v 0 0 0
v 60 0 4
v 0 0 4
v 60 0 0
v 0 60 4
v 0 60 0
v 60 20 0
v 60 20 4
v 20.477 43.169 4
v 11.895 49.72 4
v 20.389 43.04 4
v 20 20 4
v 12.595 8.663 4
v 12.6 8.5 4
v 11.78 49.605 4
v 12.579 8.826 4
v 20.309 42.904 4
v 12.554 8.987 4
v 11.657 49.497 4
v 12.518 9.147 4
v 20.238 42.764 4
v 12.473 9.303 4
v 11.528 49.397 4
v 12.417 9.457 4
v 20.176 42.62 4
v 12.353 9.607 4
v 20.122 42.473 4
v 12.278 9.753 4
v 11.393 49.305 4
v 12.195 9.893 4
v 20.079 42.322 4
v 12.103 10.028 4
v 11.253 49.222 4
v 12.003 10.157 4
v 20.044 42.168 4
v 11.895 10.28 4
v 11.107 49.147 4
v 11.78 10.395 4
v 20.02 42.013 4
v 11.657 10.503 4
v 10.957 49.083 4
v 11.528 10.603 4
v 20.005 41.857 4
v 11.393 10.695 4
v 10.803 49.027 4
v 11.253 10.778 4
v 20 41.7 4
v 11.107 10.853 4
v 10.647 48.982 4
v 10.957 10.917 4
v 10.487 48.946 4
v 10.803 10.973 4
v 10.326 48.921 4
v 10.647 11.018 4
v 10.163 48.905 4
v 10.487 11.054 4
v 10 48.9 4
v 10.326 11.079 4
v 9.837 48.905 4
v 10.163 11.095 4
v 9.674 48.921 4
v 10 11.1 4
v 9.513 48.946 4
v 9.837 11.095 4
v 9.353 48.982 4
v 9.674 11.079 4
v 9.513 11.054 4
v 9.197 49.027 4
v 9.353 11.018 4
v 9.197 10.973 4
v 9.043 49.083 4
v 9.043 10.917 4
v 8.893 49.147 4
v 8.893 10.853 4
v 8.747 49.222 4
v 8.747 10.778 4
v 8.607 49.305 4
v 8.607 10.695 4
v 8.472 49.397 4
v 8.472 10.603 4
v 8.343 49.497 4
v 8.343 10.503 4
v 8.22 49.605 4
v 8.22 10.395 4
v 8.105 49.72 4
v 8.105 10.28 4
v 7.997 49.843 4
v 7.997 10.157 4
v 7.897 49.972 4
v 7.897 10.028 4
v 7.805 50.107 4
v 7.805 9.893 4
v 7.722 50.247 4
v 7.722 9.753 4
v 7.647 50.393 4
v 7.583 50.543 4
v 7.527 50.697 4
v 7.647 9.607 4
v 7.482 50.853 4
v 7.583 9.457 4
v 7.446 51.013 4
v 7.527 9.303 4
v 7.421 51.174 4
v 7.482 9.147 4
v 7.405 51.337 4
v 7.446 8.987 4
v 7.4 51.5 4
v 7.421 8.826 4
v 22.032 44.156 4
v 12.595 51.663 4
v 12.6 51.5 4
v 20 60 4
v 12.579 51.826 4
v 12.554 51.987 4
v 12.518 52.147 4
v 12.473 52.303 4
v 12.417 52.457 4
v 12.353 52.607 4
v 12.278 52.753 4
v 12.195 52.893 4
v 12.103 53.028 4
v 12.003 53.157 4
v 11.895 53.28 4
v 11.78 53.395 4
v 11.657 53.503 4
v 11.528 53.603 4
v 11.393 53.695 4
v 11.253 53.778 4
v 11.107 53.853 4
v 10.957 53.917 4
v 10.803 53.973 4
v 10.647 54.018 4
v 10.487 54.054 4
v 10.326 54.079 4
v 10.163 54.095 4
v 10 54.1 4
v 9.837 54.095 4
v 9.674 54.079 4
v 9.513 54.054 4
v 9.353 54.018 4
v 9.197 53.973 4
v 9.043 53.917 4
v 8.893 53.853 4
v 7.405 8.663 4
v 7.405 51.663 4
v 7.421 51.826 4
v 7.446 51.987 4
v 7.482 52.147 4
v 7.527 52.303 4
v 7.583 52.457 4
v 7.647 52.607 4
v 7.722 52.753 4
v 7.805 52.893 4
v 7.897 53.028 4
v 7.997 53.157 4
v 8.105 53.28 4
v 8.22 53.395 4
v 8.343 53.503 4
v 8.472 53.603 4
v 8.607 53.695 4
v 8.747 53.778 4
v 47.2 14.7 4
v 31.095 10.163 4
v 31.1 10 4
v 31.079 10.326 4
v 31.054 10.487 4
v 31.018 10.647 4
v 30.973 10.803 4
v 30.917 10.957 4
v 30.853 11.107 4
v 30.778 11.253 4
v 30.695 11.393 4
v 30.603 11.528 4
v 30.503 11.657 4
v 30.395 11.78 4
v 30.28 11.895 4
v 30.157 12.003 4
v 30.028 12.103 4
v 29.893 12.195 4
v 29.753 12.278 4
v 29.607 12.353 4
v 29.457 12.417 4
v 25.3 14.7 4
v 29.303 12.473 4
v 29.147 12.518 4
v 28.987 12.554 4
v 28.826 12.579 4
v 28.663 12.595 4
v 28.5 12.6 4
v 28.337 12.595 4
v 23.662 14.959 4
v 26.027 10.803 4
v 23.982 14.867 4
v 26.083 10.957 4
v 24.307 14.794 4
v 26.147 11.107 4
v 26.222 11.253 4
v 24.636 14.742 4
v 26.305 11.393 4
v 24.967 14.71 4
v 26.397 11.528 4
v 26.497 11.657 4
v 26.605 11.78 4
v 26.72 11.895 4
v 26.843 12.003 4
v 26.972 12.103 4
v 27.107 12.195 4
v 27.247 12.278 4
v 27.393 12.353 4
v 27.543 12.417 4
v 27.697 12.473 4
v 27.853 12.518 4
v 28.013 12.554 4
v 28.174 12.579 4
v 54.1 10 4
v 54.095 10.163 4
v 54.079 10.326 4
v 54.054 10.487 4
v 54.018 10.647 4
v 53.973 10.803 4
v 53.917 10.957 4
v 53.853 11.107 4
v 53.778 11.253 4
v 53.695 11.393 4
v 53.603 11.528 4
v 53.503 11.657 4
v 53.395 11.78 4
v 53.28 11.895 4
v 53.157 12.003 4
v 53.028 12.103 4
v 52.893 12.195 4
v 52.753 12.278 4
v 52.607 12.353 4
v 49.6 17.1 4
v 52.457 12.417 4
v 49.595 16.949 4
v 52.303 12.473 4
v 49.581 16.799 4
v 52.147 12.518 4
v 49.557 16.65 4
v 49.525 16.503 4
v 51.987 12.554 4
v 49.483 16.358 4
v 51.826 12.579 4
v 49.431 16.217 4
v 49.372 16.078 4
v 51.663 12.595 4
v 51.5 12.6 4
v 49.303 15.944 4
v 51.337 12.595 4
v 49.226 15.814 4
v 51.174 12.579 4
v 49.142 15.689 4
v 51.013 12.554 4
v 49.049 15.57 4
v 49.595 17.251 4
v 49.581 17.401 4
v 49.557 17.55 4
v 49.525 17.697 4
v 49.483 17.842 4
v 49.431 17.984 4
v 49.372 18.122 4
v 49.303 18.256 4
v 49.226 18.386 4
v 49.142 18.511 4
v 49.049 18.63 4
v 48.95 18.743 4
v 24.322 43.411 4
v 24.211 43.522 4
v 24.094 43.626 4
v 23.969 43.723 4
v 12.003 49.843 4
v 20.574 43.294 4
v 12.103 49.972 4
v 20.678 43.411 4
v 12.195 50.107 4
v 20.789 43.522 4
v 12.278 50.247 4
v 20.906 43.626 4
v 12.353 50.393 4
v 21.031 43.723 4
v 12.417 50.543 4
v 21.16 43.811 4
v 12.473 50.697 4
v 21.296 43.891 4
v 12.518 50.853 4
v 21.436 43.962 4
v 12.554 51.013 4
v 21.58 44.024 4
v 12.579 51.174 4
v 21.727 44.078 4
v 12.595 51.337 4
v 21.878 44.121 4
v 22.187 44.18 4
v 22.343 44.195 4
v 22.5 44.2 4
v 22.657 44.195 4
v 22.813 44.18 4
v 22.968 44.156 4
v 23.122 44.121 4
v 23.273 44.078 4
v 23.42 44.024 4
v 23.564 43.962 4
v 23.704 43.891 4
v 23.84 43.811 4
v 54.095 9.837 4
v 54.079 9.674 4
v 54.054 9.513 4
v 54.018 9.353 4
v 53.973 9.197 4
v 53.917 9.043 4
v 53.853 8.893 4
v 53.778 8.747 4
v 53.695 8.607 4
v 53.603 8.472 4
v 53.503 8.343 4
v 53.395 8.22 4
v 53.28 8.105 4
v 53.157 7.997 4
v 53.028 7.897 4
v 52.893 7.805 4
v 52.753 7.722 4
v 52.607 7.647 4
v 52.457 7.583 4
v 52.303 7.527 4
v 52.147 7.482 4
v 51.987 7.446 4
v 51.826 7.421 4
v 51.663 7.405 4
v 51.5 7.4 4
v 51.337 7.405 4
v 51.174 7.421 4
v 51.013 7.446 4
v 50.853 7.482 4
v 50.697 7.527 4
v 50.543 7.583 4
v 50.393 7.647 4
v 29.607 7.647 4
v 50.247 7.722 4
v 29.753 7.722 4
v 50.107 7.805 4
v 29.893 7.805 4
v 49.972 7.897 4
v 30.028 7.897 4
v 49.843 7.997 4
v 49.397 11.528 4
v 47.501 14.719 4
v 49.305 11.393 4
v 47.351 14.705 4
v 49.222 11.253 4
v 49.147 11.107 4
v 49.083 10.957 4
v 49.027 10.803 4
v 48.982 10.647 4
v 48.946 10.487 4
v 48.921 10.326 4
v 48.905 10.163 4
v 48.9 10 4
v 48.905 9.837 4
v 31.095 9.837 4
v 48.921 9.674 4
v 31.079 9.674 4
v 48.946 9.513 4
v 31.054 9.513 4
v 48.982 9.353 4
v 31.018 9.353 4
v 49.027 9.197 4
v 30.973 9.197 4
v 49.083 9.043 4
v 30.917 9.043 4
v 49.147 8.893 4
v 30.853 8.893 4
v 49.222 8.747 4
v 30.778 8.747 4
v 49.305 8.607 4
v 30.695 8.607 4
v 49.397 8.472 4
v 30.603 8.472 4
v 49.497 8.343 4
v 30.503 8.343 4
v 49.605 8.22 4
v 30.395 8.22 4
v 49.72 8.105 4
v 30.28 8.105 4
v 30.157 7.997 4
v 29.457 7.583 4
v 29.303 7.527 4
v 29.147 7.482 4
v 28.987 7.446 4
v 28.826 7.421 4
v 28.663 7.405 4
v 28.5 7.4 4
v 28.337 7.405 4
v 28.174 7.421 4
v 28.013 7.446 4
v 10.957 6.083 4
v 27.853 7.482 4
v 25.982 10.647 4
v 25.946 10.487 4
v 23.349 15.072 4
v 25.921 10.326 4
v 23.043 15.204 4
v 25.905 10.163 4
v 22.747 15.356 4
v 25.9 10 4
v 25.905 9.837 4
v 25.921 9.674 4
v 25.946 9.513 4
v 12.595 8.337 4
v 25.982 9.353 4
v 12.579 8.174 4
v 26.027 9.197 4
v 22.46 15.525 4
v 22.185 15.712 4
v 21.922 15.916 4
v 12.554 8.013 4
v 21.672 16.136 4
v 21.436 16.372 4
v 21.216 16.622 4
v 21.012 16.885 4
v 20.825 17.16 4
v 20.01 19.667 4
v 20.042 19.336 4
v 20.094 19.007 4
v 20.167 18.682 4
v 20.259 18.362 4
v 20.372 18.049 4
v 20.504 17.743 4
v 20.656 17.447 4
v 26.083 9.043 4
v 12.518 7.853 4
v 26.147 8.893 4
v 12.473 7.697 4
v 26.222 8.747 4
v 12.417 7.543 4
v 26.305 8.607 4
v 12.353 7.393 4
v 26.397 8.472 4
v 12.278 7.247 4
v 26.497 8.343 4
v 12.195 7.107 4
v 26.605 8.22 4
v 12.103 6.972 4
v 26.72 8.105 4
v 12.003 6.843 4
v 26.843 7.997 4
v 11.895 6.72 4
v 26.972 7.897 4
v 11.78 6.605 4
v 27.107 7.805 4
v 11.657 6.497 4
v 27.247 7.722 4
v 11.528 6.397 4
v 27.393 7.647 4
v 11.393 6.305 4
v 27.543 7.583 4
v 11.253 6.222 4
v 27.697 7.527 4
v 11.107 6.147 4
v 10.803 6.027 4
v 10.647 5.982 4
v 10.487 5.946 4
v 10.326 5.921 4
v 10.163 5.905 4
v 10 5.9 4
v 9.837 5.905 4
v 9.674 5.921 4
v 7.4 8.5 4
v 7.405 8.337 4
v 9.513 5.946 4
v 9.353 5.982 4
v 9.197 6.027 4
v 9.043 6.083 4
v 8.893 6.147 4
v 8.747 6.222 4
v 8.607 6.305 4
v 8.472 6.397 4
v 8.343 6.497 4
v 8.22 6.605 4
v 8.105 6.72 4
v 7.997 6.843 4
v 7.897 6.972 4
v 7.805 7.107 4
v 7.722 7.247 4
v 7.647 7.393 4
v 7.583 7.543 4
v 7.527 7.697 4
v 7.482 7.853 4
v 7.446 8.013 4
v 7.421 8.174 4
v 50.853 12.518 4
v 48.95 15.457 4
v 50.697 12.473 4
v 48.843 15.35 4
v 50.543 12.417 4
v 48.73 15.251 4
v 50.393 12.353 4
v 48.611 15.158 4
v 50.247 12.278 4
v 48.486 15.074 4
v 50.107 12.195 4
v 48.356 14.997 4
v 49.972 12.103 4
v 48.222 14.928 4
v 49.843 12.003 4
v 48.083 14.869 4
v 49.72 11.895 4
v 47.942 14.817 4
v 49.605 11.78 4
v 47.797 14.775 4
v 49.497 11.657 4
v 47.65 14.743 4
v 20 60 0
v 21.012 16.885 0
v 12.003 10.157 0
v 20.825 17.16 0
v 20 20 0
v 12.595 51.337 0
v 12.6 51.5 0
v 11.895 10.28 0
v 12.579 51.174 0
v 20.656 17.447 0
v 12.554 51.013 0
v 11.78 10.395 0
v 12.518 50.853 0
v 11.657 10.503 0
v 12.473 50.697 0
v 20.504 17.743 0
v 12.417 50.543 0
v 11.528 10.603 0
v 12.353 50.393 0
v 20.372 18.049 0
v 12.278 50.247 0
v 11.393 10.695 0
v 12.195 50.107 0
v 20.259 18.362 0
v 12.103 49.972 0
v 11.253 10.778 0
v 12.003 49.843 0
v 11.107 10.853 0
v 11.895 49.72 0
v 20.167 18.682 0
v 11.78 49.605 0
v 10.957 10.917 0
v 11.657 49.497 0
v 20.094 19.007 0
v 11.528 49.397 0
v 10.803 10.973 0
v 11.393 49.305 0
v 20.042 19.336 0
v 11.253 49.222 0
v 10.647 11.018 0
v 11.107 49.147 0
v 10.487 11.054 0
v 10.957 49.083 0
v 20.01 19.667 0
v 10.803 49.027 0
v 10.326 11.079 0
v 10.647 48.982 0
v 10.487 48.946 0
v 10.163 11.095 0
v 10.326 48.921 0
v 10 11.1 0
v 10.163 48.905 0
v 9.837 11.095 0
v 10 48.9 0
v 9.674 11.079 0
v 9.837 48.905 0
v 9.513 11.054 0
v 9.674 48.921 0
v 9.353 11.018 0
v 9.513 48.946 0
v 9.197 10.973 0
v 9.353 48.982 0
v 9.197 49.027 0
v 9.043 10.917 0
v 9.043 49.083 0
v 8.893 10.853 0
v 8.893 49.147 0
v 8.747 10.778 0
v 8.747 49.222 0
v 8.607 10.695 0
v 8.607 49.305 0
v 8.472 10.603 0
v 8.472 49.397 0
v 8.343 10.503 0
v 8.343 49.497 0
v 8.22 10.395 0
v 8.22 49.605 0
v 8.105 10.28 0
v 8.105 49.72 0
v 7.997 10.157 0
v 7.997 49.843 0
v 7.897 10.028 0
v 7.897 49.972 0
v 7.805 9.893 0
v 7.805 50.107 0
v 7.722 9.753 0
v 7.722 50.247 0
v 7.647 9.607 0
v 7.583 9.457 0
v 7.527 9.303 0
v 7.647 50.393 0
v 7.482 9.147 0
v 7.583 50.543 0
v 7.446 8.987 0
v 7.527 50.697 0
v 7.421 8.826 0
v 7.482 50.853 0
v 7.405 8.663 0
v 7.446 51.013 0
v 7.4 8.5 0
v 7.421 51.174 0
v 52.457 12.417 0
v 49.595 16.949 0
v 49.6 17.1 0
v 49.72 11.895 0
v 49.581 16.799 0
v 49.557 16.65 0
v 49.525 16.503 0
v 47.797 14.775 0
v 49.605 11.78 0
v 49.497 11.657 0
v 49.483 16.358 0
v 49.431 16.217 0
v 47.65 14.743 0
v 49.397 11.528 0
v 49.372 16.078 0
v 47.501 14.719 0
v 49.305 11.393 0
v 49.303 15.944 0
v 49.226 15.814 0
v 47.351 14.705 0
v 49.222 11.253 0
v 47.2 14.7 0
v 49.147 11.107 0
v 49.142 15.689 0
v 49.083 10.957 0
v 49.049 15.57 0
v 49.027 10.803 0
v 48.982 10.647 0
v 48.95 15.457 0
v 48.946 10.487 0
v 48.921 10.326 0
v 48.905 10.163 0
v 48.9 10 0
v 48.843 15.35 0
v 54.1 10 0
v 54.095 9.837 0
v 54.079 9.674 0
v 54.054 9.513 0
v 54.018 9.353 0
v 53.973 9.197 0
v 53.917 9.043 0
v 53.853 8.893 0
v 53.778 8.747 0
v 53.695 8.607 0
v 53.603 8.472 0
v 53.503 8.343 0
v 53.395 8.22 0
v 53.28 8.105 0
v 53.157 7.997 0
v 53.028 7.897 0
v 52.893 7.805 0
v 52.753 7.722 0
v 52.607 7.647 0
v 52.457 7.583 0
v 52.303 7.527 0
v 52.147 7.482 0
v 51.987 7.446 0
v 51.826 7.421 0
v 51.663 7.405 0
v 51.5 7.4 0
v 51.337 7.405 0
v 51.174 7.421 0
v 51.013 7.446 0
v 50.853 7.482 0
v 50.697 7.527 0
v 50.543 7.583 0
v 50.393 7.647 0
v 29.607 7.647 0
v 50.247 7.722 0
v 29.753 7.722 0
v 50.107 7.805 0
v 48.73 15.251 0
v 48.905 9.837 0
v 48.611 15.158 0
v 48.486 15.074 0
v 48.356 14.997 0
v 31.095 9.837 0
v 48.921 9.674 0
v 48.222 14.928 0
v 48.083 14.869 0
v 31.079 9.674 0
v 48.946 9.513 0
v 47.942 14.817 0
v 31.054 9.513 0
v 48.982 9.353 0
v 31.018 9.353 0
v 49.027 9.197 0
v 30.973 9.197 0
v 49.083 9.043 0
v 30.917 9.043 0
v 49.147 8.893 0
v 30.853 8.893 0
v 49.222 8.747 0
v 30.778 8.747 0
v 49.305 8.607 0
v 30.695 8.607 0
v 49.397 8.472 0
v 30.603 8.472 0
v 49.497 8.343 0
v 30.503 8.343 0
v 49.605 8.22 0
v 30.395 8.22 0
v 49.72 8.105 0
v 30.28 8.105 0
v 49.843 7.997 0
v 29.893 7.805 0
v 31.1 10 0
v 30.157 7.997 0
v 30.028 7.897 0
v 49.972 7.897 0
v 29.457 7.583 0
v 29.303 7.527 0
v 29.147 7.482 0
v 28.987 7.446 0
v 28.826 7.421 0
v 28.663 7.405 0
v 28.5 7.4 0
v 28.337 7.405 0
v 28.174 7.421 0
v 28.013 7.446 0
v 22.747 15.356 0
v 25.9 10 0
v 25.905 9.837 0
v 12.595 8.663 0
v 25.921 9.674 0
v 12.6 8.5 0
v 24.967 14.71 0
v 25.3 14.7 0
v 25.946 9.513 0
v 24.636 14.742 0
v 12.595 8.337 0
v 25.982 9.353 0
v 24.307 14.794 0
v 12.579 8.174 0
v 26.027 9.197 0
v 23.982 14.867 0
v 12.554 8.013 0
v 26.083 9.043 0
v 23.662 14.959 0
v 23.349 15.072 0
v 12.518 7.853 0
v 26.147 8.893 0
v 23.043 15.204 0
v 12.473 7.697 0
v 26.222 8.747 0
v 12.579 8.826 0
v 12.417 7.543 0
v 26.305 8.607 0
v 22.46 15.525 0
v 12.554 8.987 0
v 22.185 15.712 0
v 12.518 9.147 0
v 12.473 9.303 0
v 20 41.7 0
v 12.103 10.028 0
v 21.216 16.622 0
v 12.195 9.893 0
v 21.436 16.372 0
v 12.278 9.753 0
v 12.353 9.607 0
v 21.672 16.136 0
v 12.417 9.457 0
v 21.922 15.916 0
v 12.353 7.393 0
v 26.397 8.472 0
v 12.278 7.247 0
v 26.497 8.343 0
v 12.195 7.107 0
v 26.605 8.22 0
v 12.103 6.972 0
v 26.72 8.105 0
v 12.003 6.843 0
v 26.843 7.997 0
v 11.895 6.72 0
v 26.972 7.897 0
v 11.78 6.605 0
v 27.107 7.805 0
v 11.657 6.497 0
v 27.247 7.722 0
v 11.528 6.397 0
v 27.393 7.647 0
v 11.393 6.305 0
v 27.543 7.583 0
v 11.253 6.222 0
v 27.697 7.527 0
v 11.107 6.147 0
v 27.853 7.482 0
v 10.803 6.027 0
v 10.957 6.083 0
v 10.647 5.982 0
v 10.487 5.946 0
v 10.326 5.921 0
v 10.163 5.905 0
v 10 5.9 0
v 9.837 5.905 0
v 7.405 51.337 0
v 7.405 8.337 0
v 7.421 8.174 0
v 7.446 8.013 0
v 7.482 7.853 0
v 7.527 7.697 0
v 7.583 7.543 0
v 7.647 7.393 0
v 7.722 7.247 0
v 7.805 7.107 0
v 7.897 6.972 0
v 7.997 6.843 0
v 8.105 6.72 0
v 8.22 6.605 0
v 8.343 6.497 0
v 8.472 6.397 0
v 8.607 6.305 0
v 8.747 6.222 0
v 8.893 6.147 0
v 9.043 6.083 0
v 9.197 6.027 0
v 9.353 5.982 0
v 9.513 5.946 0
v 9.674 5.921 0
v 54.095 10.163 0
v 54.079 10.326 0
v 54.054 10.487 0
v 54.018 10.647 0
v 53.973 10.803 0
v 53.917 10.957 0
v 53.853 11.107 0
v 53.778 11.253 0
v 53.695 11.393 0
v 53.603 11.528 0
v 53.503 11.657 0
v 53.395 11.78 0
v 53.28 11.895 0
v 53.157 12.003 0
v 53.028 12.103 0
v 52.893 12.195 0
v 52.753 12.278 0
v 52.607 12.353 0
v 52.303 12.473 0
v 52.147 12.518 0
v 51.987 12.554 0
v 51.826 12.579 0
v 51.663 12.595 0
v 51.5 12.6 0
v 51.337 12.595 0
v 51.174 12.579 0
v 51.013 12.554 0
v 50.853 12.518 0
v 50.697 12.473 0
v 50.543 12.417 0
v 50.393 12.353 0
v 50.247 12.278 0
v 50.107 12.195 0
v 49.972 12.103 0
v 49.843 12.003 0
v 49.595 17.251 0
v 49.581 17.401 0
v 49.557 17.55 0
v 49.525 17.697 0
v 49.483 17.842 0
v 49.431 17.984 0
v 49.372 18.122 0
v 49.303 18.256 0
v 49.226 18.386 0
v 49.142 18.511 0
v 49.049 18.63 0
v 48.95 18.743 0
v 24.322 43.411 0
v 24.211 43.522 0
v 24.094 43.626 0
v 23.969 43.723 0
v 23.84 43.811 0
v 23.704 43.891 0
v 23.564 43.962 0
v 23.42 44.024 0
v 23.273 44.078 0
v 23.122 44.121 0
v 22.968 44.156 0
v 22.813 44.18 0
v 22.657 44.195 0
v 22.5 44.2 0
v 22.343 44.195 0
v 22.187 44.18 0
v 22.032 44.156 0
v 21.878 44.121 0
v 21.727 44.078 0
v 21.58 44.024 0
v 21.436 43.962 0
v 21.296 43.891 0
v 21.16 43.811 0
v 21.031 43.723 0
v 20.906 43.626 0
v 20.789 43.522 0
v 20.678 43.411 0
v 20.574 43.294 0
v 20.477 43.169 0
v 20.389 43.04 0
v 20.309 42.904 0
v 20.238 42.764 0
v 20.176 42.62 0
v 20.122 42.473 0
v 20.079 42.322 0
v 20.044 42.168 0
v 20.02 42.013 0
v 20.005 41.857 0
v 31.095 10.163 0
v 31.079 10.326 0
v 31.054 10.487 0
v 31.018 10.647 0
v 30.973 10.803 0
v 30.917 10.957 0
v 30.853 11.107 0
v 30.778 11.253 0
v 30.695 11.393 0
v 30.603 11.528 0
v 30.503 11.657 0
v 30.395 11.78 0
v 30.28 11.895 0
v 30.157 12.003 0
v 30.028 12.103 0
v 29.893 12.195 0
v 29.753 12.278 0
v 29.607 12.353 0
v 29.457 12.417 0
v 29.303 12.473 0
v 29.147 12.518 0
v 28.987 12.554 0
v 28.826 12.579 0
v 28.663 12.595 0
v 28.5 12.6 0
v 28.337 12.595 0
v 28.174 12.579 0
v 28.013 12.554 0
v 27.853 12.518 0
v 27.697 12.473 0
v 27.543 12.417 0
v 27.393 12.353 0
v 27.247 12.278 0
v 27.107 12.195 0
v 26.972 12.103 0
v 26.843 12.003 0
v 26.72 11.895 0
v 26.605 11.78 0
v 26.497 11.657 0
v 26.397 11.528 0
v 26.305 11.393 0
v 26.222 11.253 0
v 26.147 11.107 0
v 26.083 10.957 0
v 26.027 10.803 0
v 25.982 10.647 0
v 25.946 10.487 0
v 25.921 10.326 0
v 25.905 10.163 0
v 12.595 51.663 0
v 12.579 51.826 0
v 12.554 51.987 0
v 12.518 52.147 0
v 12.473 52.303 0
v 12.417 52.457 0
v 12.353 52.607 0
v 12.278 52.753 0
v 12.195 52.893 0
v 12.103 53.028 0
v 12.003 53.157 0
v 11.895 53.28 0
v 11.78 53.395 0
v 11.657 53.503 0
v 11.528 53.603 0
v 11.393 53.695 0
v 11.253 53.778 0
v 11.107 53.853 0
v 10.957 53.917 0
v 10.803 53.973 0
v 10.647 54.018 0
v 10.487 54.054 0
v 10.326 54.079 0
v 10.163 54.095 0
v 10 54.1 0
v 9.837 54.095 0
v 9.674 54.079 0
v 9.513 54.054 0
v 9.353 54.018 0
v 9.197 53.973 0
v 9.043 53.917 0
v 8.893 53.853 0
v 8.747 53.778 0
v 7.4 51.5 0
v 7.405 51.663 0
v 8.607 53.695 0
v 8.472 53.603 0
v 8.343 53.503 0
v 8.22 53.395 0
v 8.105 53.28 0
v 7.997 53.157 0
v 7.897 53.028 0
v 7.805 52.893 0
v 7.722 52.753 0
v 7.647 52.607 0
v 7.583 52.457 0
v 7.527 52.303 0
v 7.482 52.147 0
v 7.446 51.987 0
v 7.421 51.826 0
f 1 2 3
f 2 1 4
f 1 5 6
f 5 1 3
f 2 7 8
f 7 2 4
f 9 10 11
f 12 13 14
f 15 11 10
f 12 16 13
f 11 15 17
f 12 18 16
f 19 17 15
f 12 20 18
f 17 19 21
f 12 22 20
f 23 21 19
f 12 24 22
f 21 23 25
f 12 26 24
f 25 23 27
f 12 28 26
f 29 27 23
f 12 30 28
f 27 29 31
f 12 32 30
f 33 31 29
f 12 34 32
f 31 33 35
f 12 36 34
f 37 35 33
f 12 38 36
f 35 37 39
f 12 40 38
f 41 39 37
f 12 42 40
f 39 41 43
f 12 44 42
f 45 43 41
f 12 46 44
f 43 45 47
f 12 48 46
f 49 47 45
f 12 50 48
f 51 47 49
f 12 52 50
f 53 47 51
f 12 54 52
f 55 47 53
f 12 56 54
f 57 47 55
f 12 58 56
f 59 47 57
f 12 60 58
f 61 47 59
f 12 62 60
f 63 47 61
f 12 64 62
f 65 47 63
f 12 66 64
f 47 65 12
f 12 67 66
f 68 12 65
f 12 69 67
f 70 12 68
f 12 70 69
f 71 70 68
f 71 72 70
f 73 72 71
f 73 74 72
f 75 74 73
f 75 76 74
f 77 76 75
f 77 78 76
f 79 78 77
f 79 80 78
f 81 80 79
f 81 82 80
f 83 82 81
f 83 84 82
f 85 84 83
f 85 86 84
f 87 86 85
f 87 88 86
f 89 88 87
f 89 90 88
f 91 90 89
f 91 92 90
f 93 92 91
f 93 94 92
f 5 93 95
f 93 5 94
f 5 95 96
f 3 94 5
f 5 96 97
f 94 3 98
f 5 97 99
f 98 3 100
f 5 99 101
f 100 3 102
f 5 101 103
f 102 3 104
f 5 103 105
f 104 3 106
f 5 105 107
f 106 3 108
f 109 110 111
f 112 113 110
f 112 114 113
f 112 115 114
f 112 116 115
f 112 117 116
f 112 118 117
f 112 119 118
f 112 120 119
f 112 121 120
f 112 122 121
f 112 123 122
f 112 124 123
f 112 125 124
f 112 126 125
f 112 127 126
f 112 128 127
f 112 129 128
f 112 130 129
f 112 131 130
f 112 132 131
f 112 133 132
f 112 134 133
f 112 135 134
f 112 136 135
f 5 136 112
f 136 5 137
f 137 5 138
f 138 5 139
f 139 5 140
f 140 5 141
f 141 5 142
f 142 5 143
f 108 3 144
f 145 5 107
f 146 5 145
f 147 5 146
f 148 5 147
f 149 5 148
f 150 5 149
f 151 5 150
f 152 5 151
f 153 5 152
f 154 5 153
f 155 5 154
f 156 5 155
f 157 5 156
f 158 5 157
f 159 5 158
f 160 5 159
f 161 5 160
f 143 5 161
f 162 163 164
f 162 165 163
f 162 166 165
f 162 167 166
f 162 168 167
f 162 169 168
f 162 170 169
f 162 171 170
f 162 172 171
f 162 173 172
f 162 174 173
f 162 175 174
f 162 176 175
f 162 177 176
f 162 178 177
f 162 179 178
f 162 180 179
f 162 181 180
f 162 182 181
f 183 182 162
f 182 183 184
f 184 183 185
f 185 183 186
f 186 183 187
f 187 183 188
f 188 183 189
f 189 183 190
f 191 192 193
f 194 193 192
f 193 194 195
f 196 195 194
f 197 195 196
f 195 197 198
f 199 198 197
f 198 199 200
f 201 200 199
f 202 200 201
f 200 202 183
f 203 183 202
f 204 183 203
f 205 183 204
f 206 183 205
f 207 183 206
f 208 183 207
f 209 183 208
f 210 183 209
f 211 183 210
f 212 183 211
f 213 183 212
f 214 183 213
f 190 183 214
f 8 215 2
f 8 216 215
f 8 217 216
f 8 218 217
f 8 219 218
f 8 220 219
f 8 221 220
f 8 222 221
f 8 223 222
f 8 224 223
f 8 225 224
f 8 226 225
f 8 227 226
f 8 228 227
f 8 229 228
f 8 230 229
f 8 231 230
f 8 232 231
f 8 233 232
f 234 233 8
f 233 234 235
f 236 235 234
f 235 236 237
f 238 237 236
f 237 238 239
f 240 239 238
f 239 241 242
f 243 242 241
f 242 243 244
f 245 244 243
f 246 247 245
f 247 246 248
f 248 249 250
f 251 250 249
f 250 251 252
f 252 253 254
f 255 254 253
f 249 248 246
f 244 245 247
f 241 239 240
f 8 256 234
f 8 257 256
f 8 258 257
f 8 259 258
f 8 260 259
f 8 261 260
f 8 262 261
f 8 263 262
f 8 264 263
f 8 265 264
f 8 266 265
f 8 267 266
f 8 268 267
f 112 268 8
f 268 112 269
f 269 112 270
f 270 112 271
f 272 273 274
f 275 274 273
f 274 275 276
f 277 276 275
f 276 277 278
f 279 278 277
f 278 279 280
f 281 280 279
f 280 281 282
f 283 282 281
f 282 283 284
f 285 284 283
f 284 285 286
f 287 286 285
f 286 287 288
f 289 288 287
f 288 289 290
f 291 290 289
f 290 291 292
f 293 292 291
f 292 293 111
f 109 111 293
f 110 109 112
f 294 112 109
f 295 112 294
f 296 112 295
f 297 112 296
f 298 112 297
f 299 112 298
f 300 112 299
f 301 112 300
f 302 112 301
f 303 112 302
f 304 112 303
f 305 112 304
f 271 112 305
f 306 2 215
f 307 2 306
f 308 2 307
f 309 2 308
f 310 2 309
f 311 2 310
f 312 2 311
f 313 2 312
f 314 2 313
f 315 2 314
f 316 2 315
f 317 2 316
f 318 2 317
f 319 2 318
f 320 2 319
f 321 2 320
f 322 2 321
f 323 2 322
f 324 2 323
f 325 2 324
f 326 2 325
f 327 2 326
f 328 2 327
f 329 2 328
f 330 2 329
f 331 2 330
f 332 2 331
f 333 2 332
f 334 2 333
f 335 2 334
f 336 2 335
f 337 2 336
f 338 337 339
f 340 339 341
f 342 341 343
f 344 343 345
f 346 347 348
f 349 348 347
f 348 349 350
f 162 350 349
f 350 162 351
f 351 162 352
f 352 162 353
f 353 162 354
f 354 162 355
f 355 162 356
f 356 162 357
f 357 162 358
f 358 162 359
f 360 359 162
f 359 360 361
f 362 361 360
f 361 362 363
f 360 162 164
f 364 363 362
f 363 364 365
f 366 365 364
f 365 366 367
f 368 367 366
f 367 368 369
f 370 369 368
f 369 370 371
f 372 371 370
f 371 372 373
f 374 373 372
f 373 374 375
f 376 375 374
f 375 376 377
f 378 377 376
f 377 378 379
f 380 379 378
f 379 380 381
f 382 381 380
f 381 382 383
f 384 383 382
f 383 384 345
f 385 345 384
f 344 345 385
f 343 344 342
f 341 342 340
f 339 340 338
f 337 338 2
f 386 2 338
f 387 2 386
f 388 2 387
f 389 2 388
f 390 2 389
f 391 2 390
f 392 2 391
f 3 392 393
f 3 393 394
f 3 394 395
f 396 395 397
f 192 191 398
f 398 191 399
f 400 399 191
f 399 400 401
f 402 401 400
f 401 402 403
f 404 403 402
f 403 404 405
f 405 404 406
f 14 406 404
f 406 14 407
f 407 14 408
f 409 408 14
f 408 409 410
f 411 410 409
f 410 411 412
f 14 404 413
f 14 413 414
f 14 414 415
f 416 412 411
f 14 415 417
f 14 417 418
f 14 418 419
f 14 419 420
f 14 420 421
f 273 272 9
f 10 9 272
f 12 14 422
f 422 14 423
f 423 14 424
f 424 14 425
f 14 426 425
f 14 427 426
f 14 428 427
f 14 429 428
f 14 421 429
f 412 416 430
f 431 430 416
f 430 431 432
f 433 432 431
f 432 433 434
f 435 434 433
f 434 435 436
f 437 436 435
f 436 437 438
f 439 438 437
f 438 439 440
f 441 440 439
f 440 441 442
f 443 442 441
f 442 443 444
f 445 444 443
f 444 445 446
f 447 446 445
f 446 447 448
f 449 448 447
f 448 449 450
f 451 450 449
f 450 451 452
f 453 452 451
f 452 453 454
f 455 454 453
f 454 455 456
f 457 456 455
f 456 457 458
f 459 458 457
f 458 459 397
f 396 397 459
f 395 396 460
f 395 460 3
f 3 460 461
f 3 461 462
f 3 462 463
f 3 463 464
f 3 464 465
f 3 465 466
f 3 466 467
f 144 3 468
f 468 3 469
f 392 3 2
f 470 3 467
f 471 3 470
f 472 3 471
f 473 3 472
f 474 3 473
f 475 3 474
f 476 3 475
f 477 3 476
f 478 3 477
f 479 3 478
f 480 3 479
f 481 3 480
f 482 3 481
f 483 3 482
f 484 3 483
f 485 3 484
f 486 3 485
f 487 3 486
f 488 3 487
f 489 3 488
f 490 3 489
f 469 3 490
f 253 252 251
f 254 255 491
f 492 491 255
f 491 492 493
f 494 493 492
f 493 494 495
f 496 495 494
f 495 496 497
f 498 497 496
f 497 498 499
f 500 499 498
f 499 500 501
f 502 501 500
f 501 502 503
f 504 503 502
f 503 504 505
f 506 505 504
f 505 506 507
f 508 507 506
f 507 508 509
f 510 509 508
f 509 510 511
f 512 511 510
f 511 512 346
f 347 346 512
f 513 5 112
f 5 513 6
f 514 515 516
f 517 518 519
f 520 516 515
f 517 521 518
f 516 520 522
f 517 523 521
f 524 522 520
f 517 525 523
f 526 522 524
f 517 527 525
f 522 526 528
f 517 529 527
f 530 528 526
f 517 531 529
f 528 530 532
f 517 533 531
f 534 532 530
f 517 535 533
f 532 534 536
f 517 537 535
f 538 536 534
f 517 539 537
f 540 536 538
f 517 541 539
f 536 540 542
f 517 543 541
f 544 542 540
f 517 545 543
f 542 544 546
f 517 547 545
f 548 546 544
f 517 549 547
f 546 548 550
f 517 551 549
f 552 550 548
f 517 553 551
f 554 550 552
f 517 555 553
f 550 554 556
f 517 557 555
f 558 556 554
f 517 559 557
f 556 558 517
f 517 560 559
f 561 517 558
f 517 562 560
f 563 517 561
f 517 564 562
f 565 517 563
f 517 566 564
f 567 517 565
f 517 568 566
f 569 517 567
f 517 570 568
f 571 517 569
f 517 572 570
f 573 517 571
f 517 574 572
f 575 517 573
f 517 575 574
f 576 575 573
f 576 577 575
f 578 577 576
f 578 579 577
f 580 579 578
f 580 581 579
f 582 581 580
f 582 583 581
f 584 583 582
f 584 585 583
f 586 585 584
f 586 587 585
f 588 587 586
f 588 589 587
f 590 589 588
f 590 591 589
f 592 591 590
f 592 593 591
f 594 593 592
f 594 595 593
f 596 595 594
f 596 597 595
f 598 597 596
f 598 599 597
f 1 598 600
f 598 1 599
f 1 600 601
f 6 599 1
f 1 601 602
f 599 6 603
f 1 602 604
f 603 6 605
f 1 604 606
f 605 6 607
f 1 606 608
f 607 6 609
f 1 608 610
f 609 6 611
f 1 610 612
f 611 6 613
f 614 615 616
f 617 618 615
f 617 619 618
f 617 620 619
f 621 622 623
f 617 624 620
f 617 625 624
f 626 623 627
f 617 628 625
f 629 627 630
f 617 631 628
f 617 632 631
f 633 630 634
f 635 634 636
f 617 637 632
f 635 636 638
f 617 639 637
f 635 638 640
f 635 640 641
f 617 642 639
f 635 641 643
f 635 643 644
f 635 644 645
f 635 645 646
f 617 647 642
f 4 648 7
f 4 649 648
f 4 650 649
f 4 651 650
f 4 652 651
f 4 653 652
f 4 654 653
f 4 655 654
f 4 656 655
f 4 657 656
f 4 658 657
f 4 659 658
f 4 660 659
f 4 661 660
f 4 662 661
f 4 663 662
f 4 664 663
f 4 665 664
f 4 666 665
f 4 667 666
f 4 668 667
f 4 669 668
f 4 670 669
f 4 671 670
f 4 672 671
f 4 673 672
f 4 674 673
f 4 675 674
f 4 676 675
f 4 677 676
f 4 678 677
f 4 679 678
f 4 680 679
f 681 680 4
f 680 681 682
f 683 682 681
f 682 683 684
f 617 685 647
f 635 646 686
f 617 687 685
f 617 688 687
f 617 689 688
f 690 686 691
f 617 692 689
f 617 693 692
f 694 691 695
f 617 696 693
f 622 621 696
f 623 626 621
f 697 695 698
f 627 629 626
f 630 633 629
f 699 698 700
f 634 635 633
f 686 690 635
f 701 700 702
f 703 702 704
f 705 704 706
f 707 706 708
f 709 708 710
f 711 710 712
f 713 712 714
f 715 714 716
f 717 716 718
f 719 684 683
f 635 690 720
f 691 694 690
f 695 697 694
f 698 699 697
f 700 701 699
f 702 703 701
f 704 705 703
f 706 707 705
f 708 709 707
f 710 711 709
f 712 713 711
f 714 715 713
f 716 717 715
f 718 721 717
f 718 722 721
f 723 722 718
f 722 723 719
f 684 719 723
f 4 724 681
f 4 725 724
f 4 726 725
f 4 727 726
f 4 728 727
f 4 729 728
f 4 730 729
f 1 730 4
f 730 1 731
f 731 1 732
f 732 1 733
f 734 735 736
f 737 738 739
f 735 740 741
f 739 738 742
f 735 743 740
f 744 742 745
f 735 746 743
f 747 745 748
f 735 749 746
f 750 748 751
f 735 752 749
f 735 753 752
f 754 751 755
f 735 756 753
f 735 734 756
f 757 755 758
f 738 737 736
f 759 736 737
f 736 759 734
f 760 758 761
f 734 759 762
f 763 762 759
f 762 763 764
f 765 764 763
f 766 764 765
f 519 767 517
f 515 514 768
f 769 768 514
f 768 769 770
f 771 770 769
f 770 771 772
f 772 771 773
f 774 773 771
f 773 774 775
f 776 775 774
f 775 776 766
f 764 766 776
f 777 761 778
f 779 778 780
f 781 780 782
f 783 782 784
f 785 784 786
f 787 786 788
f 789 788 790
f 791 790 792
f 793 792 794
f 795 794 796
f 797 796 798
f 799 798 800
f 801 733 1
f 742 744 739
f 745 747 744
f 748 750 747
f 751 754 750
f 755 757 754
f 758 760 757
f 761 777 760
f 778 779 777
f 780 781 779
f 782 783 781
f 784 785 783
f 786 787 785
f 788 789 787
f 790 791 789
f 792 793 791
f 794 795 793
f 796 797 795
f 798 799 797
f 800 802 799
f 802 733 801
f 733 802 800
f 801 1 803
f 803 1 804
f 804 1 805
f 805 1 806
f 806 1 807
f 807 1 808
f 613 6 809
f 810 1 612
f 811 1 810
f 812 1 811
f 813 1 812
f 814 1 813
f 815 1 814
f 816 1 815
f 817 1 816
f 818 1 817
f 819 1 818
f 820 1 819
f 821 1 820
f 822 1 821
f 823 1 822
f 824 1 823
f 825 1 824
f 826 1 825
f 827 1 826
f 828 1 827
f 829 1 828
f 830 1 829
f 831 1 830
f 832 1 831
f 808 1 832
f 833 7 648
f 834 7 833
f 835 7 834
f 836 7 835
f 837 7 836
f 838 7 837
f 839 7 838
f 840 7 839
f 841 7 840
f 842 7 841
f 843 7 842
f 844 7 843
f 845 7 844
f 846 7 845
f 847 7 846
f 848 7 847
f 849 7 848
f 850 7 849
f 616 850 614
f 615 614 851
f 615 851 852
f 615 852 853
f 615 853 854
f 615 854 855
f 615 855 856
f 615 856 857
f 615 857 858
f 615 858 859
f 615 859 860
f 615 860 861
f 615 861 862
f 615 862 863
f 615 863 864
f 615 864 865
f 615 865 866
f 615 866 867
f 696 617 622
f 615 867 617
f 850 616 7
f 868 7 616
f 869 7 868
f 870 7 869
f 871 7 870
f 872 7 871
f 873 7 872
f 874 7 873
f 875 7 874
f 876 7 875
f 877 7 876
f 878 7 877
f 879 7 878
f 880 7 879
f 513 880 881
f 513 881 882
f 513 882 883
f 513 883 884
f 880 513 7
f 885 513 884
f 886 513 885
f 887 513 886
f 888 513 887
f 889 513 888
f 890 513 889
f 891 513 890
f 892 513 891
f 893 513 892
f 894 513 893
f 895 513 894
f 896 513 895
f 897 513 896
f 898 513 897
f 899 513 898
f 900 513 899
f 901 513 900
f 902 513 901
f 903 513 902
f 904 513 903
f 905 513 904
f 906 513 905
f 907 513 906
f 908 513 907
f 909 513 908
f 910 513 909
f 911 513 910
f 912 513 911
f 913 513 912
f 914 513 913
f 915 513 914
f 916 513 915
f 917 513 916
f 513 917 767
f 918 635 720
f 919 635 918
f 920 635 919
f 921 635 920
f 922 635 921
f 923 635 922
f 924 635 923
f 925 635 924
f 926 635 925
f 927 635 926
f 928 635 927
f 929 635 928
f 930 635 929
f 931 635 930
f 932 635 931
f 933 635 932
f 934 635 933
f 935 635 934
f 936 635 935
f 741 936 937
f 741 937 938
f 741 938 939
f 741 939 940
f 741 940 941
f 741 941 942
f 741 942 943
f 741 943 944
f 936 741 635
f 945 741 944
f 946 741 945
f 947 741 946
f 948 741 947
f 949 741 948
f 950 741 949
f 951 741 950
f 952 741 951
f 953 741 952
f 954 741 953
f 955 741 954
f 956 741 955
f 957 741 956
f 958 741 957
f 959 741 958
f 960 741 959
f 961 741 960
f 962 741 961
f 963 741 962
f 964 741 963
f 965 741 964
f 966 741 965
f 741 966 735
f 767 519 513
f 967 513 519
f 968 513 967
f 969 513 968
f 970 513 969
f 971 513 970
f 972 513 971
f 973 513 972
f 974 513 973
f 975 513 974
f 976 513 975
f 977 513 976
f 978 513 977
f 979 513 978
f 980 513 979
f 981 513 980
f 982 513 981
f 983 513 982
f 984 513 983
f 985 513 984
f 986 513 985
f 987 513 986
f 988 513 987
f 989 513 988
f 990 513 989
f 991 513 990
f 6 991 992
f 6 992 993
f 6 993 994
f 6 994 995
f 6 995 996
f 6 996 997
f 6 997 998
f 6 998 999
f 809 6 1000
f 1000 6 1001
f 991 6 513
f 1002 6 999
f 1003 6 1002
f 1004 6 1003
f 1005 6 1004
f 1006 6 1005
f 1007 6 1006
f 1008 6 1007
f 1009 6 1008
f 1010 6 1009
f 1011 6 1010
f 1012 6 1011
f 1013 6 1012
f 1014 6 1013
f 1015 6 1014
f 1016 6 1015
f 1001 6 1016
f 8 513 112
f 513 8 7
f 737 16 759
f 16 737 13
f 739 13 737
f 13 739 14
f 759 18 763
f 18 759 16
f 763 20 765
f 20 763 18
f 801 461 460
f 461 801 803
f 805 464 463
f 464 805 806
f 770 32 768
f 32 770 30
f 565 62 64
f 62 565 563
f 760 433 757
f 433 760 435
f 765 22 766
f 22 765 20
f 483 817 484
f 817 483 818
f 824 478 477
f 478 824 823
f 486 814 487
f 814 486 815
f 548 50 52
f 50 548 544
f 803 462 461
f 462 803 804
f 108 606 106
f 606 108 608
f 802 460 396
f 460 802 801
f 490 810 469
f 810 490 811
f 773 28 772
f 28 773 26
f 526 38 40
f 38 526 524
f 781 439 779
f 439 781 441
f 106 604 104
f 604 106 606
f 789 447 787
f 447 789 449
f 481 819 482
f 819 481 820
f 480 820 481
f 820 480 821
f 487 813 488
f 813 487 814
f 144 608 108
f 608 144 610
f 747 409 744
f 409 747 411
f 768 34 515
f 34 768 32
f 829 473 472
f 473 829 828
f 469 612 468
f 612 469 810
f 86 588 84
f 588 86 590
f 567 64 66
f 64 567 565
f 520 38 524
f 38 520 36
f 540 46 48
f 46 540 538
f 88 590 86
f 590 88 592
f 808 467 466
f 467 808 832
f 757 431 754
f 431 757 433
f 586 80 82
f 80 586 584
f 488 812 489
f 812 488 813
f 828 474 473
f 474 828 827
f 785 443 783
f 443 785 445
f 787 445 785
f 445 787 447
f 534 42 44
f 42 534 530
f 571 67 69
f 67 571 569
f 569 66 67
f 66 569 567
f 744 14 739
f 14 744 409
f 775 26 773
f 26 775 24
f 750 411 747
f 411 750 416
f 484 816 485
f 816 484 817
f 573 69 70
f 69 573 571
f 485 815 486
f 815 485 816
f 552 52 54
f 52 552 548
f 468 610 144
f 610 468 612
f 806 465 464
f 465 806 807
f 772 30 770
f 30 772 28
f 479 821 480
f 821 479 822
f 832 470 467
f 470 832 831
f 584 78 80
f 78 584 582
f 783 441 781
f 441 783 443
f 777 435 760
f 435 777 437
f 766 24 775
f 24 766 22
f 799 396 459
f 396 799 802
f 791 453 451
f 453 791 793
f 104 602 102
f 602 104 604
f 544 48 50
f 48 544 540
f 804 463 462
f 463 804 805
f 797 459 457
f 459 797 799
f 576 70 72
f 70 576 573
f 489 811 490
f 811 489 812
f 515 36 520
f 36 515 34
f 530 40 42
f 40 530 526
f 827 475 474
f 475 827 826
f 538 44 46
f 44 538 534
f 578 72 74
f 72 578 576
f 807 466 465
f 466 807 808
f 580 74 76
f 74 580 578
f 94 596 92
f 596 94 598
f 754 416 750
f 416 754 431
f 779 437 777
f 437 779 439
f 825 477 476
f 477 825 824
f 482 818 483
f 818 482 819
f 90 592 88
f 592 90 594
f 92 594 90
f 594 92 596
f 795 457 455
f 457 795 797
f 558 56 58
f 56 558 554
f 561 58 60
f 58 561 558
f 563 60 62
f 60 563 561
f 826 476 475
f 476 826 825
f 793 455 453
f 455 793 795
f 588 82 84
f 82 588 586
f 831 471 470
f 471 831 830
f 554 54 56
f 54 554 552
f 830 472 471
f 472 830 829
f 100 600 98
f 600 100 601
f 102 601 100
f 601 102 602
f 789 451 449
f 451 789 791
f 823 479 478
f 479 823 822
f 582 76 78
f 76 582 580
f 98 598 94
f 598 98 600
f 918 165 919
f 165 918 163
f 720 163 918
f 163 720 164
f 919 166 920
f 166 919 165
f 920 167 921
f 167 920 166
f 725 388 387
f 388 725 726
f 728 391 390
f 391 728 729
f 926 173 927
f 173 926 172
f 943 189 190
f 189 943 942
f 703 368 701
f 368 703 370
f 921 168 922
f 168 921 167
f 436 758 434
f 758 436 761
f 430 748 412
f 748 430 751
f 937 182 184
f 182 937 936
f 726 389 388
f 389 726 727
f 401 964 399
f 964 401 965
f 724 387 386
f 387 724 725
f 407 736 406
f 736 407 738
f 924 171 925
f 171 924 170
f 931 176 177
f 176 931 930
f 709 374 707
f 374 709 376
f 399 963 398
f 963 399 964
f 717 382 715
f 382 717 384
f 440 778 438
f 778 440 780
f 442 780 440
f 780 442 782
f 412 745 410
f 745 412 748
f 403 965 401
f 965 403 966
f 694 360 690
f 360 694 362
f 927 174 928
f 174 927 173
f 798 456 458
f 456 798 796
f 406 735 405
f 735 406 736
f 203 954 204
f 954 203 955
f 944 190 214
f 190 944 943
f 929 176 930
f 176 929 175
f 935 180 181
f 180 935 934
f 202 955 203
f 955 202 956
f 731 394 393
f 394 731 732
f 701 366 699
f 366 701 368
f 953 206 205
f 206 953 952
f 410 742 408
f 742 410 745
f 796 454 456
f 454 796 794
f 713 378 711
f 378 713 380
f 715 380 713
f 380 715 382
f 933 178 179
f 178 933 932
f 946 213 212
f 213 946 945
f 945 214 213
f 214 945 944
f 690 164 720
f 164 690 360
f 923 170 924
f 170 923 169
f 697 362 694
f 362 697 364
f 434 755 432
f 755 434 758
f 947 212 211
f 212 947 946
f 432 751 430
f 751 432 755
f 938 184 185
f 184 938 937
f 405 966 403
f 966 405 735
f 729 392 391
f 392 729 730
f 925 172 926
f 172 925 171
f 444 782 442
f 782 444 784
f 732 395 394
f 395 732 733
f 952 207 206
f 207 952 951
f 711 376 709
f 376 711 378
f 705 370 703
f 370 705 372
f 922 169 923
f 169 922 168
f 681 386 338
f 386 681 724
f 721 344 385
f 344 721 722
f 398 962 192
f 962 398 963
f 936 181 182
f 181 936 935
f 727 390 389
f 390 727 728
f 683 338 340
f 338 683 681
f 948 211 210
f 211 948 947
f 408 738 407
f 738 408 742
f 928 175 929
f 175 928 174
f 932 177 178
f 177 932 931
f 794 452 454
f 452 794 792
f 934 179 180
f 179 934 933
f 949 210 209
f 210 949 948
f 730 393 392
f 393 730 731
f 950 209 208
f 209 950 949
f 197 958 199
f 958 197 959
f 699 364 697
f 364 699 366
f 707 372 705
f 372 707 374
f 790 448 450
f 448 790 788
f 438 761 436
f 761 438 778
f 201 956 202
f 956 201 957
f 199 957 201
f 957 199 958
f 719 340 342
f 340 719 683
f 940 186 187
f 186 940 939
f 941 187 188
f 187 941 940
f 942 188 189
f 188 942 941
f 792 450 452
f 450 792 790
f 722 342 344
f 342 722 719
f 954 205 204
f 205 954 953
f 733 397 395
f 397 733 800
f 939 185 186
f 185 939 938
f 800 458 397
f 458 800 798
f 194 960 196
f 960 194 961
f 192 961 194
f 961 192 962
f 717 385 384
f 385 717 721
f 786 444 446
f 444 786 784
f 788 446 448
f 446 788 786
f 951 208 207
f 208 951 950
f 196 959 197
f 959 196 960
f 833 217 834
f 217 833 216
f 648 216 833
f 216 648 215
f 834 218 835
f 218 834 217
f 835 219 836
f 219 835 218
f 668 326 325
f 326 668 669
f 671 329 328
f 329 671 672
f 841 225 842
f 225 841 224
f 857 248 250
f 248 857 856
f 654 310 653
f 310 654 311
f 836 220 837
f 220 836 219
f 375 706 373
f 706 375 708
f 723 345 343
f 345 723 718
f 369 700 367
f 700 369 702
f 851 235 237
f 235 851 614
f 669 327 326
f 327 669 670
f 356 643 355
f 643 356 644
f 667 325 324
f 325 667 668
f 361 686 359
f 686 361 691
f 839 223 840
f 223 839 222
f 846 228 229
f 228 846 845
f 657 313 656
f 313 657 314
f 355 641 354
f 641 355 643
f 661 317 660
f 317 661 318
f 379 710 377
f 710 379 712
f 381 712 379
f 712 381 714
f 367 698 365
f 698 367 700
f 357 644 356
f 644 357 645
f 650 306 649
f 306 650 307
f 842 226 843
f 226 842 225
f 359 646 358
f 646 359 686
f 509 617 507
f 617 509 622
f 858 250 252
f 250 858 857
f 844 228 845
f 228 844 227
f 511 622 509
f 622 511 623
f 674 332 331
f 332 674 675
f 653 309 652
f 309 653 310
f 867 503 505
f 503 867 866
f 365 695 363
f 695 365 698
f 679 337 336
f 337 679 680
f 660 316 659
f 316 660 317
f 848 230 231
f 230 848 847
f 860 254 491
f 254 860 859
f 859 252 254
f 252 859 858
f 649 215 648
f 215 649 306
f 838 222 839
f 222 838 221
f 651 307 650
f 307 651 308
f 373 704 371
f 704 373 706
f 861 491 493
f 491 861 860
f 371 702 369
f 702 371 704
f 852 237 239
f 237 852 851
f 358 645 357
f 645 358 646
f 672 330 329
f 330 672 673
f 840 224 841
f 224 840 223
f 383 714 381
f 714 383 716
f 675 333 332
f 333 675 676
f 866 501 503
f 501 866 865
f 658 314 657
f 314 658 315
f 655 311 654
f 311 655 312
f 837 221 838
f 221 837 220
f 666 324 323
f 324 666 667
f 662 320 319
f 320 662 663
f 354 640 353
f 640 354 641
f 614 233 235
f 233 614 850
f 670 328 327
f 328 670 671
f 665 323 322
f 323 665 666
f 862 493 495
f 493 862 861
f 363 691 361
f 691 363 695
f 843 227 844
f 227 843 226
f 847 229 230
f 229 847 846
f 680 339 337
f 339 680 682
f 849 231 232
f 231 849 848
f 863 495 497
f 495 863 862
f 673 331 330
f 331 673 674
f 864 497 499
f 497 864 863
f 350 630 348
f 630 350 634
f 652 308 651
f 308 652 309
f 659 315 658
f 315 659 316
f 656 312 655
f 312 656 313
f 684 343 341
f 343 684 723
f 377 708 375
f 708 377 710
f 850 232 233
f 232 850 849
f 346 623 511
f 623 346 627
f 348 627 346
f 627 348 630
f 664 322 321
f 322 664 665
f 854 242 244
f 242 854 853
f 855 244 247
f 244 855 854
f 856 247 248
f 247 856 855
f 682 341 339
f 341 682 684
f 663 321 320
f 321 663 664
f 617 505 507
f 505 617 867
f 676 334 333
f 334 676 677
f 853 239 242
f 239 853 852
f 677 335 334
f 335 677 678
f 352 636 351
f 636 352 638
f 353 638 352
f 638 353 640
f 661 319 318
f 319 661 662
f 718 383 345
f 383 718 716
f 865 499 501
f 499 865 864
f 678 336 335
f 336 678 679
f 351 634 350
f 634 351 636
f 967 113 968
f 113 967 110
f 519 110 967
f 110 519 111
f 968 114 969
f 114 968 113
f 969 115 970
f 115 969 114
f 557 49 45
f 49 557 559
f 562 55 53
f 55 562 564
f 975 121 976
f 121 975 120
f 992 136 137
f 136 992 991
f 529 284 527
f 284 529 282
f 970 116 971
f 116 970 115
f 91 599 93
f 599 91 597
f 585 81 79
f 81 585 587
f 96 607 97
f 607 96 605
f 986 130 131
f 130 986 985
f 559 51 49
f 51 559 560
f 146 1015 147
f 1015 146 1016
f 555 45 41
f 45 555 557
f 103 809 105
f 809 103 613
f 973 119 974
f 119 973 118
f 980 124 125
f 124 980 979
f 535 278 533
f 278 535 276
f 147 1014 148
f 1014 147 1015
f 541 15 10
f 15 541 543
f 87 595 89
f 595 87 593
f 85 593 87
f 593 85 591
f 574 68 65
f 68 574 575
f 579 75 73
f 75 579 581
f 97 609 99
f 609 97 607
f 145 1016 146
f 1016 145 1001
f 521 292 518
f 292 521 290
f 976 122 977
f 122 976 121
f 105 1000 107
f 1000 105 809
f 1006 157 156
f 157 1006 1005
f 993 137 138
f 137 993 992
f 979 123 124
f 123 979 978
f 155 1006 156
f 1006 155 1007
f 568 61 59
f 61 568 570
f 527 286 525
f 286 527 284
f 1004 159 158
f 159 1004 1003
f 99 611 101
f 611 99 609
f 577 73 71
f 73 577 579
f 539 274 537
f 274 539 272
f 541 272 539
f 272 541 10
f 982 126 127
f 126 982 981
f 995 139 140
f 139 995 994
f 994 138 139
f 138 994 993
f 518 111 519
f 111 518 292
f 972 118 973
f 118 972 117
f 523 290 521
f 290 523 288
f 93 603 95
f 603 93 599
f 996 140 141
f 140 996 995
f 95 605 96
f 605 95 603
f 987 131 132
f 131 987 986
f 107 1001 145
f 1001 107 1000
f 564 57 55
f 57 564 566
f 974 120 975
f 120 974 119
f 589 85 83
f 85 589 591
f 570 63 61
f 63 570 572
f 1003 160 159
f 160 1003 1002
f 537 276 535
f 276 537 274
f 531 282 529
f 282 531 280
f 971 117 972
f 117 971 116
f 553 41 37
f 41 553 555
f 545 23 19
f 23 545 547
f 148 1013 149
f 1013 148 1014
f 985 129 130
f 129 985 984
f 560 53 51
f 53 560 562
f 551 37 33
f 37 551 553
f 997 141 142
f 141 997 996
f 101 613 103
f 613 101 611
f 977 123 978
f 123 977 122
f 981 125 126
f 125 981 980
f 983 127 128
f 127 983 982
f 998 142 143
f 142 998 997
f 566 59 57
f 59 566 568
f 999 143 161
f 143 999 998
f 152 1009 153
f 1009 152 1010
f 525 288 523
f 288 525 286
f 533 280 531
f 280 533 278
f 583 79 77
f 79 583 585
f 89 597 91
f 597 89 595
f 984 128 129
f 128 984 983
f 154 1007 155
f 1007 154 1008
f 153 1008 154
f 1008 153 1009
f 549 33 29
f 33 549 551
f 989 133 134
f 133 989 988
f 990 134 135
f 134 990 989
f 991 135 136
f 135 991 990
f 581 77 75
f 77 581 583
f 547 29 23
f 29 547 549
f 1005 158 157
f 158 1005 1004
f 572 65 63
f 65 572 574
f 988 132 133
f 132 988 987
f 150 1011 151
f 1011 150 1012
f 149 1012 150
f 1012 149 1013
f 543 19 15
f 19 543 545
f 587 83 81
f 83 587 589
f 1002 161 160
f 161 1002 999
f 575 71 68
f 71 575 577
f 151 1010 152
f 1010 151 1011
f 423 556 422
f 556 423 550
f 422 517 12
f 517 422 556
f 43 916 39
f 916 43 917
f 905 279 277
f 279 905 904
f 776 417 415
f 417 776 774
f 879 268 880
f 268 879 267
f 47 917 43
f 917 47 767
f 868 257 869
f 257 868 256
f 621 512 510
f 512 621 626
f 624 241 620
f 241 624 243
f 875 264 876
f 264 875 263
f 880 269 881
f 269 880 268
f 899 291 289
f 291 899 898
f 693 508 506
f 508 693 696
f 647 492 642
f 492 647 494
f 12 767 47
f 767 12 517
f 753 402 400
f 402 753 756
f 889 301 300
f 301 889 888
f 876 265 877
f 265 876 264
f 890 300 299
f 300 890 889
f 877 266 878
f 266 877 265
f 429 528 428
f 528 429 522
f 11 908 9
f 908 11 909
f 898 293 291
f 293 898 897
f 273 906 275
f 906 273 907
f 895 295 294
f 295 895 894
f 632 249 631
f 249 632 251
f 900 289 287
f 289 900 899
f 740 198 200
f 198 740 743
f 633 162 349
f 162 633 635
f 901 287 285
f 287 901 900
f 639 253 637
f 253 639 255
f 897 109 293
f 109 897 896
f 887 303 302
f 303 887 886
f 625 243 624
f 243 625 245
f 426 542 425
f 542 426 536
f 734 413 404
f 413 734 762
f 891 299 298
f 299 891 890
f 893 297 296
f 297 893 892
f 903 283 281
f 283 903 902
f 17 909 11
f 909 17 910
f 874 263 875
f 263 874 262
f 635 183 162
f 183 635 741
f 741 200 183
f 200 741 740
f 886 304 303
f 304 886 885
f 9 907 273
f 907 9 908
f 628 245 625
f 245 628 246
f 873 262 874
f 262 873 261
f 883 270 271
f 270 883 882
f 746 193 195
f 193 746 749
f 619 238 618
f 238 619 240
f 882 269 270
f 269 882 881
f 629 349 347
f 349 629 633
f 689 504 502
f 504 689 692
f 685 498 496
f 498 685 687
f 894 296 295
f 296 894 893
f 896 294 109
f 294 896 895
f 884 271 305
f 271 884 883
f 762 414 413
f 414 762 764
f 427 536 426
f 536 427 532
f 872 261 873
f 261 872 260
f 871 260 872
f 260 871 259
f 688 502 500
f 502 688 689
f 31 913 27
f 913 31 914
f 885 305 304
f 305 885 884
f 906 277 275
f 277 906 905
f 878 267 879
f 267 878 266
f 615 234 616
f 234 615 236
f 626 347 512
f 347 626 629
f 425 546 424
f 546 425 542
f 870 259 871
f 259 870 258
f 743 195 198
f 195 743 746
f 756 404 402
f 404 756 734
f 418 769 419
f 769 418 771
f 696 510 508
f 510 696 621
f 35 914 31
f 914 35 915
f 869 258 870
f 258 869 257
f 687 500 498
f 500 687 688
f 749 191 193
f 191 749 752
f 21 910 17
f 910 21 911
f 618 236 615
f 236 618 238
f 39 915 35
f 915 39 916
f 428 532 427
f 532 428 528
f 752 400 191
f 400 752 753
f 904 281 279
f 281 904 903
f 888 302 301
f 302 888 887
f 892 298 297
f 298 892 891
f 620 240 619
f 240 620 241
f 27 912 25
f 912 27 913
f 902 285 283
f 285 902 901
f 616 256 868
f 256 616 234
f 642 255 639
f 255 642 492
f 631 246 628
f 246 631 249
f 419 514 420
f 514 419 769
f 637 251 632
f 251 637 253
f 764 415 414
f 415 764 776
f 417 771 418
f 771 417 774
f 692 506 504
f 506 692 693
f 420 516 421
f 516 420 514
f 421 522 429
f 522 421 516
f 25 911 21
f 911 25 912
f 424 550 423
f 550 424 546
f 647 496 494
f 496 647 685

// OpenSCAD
// file: functions.scad
/**********************************
	File: functions.scad
	Revision: 0.1 (10/7/2012)
	OpenSCAD version by:
	Michael Williams (gannon)
	mswillia@mtu.edu
**********************************/
include <config.scad>

//Drill a hole the given depth at the given location
module drill(x,y,radius,depth) {
	translate([x,y,-overdrill])
		cylinder(r=radius,h=depth,$fn=100);
}

module roundedcorner(radius,thickness,angle) {
	rotate([0,0,angle])
		translate([-radius+overdrill,-radius+overdrill,-overdrill])
			difference() {
				translate([-overdrill,-overdrill,0])
					cube([radius+overdrill,radius+overdrill,thickness+overdrill*2]);
				cylinder(r=radius,h=thickness+overdrill*2);
			}
}

//Usage: points is an array consisting of elements
//[x,y,r] for each point of the polygon
//Please note that x and y will be the centers
//of the rounded edges! Outside wall will be
//r away at some angle.
//Ideally I will make a function that will find
//the place to put the circle of a given radius
//based off of the points in the polygon.
module multiradiusroundedpoly(points,height) {
	linear_extrude(height=height)
		hull()
			for (p = points) {
				translate([p[0],p[1],0])
					circle(r=p[2],$fn=100);
			}
}
// file: config.scad
/**********************************
	File: config.scad
	Revision: 0.1 (10/7/2012)
	OpenSCAD version by:
	Michael Williams (gannon)
	mswillia@mtu.edu
**********************************/

/**********************************
		CONFIGURATION
**********************************/
//This is for the depth of holes so OpenSCAD renders correctly.
overdrill=0.1;

//Eventually group configurations into here. Maybe auto config for metric vs SAE components?

/**********************************
		END CONFIGURATION
**********************************/
// main file
/**********************************
	File: FrameConnecters.scad
	Revision: 0.2 (10/7/2012)
	OpenSCAD version by:
	Michael Williams (gannon)
	mswillia@mtu.edu
**********************************/
include <config.scad>
use <functions.scad>
/**********************************
		CONFIGURATION
**********************************/
//Base size
side=60;
flat=20;
thickness=4;

//Holes
radius=2.6;

/**********************************
		END CONFIGURATION
**********************************/
union() {
	//Make our base unit
	difference() {
		linear_extrude(height=thickness)
			polygon(points=[[0,0],[side,0],[side,flat],[flat,side],[0,side]]);

		//Drill the hole
		drill(flat/2,8.5,radius,thickness+overdrill*2);
		drill(flat+8.5,flat/2,radius,thickness+overdrill*2);
		drill(side-8.5,flat/2,radius,thickness+overdrill*2);
		drill(flat/2,side-8.5,radius,thickness+overdrill*2);

		translate([flat+5.3,flat,-overdrill])
			multiradiusroundedpoly([[0,0,5.3],[2.5-5.3,21.7,2.5],[21.9,2.4-5.3,2.4]],thickness+overdrill*2);
	}
}
